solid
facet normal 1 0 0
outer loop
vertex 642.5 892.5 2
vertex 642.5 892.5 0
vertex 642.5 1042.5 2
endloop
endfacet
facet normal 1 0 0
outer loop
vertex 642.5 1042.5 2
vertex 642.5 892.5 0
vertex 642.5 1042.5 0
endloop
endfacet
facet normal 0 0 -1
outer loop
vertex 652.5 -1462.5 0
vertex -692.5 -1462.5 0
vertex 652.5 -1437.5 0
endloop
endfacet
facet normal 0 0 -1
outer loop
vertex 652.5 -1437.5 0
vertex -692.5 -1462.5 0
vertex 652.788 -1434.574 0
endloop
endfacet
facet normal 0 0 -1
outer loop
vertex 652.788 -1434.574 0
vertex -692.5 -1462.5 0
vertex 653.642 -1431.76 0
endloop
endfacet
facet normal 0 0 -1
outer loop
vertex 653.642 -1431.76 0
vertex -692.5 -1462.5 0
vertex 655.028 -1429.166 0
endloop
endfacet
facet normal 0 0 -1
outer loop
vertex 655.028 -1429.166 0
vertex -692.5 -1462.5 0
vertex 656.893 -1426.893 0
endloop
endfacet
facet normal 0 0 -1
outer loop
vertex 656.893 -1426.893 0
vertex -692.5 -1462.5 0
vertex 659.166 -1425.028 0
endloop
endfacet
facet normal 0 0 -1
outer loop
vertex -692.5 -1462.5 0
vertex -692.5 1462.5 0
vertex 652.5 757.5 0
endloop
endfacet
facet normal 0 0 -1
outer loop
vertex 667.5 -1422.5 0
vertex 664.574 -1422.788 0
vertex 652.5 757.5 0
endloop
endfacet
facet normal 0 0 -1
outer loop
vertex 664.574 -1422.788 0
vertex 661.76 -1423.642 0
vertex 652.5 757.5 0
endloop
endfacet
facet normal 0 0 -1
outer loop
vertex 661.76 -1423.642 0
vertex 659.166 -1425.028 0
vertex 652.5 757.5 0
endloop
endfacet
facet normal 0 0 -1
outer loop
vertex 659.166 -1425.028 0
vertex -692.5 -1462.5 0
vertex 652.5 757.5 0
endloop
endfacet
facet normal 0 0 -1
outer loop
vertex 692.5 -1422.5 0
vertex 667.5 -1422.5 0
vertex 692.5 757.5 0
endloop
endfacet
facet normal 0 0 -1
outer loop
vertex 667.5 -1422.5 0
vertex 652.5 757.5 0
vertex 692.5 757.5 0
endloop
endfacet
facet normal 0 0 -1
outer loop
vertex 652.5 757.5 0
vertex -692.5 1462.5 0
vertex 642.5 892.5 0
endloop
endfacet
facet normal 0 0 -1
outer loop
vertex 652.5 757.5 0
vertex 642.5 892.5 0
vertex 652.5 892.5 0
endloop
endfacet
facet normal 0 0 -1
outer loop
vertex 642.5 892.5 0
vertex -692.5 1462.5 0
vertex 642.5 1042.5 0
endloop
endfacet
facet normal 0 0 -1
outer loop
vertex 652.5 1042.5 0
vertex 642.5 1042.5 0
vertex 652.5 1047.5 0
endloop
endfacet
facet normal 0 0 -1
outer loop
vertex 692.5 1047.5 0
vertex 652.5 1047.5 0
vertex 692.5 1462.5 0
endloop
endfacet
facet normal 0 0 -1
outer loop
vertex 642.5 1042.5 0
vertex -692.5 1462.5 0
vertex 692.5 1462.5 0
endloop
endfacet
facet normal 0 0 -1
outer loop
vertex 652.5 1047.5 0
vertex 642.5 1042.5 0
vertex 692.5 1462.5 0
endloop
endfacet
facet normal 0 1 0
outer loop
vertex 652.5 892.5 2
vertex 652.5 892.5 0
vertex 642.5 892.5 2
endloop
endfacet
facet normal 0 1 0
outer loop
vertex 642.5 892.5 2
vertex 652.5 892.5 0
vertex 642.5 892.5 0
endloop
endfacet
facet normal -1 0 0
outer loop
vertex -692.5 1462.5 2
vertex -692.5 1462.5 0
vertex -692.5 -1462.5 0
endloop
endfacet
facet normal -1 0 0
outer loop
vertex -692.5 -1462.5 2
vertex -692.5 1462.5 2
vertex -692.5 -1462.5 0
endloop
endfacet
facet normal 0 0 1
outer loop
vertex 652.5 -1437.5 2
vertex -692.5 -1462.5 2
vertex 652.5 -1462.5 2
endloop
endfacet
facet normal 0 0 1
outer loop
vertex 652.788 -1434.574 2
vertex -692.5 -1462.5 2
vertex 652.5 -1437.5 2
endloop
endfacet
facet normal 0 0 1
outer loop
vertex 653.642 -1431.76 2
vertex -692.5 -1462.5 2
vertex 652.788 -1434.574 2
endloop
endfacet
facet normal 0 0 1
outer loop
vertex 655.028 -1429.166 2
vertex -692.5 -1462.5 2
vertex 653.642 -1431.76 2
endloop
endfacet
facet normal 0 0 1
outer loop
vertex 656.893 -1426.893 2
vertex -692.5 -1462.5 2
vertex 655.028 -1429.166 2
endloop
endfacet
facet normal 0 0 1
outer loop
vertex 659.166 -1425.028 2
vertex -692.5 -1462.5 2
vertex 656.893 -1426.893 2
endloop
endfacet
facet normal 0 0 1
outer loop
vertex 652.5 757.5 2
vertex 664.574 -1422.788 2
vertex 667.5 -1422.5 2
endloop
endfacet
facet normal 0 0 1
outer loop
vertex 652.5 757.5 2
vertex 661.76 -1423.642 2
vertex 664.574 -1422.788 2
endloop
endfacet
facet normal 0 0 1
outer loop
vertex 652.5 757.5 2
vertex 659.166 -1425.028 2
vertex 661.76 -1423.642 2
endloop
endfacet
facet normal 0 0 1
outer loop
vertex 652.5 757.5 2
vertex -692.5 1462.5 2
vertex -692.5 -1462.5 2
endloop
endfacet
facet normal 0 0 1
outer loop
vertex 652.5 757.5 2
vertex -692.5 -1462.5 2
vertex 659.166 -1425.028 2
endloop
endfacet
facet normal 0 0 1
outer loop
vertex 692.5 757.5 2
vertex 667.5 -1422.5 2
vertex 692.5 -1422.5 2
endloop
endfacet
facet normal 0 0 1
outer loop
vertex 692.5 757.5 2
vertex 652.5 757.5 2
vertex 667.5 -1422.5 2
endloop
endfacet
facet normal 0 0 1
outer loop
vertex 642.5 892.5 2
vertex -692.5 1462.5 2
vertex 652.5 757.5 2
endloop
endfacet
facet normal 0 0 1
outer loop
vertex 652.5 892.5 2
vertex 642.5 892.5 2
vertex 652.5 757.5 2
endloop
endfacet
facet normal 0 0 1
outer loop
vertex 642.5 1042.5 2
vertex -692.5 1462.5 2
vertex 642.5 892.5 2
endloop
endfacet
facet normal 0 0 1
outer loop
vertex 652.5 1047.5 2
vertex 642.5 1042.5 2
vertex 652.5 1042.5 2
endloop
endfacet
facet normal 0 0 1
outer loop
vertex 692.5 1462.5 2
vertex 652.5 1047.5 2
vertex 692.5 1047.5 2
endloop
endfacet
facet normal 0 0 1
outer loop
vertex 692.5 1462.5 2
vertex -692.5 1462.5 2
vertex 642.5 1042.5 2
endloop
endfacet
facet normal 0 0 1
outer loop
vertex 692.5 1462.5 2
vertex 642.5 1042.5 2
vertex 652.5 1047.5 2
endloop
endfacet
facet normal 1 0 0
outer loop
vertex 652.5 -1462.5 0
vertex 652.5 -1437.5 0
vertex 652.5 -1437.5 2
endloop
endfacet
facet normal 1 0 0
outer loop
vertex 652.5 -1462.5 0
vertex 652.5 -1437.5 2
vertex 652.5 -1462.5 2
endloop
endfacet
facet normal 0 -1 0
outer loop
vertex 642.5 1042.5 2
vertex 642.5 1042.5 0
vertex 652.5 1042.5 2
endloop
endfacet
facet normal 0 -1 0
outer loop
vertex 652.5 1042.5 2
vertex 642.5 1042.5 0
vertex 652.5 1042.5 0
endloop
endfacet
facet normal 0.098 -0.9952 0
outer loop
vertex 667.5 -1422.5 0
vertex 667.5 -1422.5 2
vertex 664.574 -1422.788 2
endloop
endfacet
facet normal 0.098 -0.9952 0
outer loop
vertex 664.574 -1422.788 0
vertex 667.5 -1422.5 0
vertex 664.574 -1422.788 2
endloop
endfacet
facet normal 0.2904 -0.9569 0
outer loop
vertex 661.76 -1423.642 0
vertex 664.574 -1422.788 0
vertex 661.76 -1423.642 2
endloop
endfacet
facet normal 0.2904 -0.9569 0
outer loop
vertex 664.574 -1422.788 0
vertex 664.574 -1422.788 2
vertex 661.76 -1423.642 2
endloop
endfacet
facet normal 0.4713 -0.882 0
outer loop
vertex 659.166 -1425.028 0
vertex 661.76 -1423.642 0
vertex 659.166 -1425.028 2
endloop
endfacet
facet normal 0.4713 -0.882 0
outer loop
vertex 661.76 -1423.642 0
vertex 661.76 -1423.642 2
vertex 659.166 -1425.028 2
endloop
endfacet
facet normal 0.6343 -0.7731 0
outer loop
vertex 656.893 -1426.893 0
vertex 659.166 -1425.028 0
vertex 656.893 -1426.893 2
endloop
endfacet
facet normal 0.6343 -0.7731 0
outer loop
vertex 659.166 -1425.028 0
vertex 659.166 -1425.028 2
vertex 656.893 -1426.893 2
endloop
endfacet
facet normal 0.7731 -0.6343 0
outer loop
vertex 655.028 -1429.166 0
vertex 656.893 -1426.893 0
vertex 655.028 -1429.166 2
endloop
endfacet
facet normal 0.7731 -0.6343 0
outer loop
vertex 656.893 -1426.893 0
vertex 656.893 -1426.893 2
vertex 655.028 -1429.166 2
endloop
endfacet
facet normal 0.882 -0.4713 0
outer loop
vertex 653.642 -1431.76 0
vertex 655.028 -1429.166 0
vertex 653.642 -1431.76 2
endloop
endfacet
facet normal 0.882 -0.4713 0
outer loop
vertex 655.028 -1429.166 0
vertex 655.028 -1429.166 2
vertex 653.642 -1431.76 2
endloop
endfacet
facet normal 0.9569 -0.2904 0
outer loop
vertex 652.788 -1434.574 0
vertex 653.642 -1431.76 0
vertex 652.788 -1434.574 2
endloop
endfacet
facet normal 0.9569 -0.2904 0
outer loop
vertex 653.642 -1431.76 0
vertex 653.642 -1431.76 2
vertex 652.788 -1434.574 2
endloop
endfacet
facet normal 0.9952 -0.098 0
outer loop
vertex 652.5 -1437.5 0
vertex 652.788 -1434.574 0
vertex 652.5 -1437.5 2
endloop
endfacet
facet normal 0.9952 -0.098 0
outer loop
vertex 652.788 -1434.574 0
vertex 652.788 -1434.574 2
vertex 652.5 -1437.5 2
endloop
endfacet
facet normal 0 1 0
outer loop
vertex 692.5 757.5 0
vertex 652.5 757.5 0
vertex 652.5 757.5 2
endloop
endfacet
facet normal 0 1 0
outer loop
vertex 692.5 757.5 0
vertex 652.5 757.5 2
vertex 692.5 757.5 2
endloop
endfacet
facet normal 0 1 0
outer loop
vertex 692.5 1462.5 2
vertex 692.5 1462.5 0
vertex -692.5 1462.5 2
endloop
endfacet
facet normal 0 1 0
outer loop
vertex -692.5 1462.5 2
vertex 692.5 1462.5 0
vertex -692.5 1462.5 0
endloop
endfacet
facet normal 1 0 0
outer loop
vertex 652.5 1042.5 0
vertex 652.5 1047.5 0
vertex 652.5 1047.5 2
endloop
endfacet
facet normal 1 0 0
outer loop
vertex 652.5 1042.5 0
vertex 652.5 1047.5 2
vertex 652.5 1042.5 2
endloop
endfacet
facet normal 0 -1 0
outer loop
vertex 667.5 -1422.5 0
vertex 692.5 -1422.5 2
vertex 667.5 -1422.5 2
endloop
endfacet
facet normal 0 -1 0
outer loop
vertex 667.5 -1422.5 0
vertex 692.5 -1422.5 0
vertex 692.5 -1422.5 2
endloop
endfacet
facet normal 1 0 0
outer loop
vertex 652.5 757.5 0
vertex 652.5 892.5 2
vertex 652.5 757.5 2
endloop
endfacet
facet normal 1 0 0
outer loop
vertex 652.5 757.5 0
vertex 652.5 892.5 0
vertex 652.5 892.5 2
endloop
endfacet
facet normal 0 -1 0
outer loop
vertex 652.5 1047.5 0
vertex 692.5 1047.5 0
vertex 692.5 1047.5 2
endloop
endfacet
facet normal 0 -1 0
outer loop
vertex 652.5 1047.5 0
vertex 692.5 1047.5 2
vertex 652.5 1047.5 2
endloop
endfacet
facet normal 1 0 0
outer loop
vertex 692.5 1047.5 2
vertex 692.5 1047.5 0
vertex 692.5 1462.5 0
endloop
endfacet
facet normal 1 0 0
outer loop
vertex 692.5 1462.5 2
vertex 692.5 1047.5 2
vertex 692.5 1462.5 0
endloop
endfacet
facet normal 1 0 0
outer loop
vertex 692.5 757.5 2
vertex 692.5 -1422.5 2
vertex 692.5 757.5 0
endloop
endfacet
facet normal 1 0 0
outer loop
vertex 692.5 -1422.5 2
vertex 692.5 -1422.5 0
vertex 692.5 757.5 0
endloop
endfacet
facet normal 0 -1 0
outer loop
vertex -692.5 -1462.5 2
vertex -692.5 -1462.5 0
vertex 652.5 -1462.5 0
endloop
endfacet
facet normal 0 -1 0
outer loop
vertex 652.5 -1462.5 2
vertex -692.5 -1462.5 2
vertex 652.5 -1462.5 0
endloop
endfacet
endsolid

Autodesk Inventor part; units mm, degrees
ref_plane "YZ Plane" through (0, 0, 0) normal (1, 0, 0) x (0, 1, 0)
ref_plane "XZ Plane" through (0, 0, 0) normal (0, 1, 0) x (-1, 0, 0)
ref_plane "XY Plane" through (0, 0, 0) normal (0, 0, 1) x (1, 0, 0)
sketch "Sketch1" plane through (0, 0, 0) normal (0, 0, 1) x (1, 0, 0)
  line L0 (-692.5, -1462.5) -> (692.5, -1462.5)
  line L1 (692.5, -1462.5) -> (692.5, 1462.5)
  line L2 (692.5, 1462.5) -> (-692.5, 1462.5)
  line L3 (-692.5, 1462.5) -> (-692.5, -1462.5)
  line L4 (-692.5, -1462.5) -> (692.5, 1462.5) construction
  line L5 (692.5, -1462.5) -> (-692.5, 1462.5) construction
  line L6 (692.5, -1422.5) -> (652.5, -1422.5)
  line L7 (652.5, -1422.5) -> (652.5, -1462.5)
  line L8 (692.5, 1047.5) -> (652.5, 1047.5)
  line L9 (652.5, 1047.5) -> (652.5, 757.5)
  line L10 (652.5, 757.5) -> (692.5, 757.5)
  line L11 (692.5, 757.5) -> (692.5, 1047.5)
  line L12 (652.5, 892.5) -> (642.5, 892.5)
  line L13 (642.5, 892.5) -> (642.5, 1042.5)
  line L14 (642.5, 1042.5) -> (652.5, 1042.5)
  point P0 (0, 0)
  dimension "d154" = 1385
  dimension "d155" = 2925
  dimension "d157" = 40
  dimension "d159" = 290
  dimension "d161" = 40
  dimension "d162" = 2220
  dimension "d163" = 10
  dimension "d164" = 150
  dimension "d165" = 5
extrude "Plate5" add sketch "Sketch1" along normal blind 2 contours L3 L2 L1 L8 L9 L14 L13 L12 L10 L6 L7 L0
fillet "Corner Round1" radius 15 1 edges at (652.5, -1422.5, 1)
properties part number "PNS-0113 floor sheet 31" material "Stainless Steel"
